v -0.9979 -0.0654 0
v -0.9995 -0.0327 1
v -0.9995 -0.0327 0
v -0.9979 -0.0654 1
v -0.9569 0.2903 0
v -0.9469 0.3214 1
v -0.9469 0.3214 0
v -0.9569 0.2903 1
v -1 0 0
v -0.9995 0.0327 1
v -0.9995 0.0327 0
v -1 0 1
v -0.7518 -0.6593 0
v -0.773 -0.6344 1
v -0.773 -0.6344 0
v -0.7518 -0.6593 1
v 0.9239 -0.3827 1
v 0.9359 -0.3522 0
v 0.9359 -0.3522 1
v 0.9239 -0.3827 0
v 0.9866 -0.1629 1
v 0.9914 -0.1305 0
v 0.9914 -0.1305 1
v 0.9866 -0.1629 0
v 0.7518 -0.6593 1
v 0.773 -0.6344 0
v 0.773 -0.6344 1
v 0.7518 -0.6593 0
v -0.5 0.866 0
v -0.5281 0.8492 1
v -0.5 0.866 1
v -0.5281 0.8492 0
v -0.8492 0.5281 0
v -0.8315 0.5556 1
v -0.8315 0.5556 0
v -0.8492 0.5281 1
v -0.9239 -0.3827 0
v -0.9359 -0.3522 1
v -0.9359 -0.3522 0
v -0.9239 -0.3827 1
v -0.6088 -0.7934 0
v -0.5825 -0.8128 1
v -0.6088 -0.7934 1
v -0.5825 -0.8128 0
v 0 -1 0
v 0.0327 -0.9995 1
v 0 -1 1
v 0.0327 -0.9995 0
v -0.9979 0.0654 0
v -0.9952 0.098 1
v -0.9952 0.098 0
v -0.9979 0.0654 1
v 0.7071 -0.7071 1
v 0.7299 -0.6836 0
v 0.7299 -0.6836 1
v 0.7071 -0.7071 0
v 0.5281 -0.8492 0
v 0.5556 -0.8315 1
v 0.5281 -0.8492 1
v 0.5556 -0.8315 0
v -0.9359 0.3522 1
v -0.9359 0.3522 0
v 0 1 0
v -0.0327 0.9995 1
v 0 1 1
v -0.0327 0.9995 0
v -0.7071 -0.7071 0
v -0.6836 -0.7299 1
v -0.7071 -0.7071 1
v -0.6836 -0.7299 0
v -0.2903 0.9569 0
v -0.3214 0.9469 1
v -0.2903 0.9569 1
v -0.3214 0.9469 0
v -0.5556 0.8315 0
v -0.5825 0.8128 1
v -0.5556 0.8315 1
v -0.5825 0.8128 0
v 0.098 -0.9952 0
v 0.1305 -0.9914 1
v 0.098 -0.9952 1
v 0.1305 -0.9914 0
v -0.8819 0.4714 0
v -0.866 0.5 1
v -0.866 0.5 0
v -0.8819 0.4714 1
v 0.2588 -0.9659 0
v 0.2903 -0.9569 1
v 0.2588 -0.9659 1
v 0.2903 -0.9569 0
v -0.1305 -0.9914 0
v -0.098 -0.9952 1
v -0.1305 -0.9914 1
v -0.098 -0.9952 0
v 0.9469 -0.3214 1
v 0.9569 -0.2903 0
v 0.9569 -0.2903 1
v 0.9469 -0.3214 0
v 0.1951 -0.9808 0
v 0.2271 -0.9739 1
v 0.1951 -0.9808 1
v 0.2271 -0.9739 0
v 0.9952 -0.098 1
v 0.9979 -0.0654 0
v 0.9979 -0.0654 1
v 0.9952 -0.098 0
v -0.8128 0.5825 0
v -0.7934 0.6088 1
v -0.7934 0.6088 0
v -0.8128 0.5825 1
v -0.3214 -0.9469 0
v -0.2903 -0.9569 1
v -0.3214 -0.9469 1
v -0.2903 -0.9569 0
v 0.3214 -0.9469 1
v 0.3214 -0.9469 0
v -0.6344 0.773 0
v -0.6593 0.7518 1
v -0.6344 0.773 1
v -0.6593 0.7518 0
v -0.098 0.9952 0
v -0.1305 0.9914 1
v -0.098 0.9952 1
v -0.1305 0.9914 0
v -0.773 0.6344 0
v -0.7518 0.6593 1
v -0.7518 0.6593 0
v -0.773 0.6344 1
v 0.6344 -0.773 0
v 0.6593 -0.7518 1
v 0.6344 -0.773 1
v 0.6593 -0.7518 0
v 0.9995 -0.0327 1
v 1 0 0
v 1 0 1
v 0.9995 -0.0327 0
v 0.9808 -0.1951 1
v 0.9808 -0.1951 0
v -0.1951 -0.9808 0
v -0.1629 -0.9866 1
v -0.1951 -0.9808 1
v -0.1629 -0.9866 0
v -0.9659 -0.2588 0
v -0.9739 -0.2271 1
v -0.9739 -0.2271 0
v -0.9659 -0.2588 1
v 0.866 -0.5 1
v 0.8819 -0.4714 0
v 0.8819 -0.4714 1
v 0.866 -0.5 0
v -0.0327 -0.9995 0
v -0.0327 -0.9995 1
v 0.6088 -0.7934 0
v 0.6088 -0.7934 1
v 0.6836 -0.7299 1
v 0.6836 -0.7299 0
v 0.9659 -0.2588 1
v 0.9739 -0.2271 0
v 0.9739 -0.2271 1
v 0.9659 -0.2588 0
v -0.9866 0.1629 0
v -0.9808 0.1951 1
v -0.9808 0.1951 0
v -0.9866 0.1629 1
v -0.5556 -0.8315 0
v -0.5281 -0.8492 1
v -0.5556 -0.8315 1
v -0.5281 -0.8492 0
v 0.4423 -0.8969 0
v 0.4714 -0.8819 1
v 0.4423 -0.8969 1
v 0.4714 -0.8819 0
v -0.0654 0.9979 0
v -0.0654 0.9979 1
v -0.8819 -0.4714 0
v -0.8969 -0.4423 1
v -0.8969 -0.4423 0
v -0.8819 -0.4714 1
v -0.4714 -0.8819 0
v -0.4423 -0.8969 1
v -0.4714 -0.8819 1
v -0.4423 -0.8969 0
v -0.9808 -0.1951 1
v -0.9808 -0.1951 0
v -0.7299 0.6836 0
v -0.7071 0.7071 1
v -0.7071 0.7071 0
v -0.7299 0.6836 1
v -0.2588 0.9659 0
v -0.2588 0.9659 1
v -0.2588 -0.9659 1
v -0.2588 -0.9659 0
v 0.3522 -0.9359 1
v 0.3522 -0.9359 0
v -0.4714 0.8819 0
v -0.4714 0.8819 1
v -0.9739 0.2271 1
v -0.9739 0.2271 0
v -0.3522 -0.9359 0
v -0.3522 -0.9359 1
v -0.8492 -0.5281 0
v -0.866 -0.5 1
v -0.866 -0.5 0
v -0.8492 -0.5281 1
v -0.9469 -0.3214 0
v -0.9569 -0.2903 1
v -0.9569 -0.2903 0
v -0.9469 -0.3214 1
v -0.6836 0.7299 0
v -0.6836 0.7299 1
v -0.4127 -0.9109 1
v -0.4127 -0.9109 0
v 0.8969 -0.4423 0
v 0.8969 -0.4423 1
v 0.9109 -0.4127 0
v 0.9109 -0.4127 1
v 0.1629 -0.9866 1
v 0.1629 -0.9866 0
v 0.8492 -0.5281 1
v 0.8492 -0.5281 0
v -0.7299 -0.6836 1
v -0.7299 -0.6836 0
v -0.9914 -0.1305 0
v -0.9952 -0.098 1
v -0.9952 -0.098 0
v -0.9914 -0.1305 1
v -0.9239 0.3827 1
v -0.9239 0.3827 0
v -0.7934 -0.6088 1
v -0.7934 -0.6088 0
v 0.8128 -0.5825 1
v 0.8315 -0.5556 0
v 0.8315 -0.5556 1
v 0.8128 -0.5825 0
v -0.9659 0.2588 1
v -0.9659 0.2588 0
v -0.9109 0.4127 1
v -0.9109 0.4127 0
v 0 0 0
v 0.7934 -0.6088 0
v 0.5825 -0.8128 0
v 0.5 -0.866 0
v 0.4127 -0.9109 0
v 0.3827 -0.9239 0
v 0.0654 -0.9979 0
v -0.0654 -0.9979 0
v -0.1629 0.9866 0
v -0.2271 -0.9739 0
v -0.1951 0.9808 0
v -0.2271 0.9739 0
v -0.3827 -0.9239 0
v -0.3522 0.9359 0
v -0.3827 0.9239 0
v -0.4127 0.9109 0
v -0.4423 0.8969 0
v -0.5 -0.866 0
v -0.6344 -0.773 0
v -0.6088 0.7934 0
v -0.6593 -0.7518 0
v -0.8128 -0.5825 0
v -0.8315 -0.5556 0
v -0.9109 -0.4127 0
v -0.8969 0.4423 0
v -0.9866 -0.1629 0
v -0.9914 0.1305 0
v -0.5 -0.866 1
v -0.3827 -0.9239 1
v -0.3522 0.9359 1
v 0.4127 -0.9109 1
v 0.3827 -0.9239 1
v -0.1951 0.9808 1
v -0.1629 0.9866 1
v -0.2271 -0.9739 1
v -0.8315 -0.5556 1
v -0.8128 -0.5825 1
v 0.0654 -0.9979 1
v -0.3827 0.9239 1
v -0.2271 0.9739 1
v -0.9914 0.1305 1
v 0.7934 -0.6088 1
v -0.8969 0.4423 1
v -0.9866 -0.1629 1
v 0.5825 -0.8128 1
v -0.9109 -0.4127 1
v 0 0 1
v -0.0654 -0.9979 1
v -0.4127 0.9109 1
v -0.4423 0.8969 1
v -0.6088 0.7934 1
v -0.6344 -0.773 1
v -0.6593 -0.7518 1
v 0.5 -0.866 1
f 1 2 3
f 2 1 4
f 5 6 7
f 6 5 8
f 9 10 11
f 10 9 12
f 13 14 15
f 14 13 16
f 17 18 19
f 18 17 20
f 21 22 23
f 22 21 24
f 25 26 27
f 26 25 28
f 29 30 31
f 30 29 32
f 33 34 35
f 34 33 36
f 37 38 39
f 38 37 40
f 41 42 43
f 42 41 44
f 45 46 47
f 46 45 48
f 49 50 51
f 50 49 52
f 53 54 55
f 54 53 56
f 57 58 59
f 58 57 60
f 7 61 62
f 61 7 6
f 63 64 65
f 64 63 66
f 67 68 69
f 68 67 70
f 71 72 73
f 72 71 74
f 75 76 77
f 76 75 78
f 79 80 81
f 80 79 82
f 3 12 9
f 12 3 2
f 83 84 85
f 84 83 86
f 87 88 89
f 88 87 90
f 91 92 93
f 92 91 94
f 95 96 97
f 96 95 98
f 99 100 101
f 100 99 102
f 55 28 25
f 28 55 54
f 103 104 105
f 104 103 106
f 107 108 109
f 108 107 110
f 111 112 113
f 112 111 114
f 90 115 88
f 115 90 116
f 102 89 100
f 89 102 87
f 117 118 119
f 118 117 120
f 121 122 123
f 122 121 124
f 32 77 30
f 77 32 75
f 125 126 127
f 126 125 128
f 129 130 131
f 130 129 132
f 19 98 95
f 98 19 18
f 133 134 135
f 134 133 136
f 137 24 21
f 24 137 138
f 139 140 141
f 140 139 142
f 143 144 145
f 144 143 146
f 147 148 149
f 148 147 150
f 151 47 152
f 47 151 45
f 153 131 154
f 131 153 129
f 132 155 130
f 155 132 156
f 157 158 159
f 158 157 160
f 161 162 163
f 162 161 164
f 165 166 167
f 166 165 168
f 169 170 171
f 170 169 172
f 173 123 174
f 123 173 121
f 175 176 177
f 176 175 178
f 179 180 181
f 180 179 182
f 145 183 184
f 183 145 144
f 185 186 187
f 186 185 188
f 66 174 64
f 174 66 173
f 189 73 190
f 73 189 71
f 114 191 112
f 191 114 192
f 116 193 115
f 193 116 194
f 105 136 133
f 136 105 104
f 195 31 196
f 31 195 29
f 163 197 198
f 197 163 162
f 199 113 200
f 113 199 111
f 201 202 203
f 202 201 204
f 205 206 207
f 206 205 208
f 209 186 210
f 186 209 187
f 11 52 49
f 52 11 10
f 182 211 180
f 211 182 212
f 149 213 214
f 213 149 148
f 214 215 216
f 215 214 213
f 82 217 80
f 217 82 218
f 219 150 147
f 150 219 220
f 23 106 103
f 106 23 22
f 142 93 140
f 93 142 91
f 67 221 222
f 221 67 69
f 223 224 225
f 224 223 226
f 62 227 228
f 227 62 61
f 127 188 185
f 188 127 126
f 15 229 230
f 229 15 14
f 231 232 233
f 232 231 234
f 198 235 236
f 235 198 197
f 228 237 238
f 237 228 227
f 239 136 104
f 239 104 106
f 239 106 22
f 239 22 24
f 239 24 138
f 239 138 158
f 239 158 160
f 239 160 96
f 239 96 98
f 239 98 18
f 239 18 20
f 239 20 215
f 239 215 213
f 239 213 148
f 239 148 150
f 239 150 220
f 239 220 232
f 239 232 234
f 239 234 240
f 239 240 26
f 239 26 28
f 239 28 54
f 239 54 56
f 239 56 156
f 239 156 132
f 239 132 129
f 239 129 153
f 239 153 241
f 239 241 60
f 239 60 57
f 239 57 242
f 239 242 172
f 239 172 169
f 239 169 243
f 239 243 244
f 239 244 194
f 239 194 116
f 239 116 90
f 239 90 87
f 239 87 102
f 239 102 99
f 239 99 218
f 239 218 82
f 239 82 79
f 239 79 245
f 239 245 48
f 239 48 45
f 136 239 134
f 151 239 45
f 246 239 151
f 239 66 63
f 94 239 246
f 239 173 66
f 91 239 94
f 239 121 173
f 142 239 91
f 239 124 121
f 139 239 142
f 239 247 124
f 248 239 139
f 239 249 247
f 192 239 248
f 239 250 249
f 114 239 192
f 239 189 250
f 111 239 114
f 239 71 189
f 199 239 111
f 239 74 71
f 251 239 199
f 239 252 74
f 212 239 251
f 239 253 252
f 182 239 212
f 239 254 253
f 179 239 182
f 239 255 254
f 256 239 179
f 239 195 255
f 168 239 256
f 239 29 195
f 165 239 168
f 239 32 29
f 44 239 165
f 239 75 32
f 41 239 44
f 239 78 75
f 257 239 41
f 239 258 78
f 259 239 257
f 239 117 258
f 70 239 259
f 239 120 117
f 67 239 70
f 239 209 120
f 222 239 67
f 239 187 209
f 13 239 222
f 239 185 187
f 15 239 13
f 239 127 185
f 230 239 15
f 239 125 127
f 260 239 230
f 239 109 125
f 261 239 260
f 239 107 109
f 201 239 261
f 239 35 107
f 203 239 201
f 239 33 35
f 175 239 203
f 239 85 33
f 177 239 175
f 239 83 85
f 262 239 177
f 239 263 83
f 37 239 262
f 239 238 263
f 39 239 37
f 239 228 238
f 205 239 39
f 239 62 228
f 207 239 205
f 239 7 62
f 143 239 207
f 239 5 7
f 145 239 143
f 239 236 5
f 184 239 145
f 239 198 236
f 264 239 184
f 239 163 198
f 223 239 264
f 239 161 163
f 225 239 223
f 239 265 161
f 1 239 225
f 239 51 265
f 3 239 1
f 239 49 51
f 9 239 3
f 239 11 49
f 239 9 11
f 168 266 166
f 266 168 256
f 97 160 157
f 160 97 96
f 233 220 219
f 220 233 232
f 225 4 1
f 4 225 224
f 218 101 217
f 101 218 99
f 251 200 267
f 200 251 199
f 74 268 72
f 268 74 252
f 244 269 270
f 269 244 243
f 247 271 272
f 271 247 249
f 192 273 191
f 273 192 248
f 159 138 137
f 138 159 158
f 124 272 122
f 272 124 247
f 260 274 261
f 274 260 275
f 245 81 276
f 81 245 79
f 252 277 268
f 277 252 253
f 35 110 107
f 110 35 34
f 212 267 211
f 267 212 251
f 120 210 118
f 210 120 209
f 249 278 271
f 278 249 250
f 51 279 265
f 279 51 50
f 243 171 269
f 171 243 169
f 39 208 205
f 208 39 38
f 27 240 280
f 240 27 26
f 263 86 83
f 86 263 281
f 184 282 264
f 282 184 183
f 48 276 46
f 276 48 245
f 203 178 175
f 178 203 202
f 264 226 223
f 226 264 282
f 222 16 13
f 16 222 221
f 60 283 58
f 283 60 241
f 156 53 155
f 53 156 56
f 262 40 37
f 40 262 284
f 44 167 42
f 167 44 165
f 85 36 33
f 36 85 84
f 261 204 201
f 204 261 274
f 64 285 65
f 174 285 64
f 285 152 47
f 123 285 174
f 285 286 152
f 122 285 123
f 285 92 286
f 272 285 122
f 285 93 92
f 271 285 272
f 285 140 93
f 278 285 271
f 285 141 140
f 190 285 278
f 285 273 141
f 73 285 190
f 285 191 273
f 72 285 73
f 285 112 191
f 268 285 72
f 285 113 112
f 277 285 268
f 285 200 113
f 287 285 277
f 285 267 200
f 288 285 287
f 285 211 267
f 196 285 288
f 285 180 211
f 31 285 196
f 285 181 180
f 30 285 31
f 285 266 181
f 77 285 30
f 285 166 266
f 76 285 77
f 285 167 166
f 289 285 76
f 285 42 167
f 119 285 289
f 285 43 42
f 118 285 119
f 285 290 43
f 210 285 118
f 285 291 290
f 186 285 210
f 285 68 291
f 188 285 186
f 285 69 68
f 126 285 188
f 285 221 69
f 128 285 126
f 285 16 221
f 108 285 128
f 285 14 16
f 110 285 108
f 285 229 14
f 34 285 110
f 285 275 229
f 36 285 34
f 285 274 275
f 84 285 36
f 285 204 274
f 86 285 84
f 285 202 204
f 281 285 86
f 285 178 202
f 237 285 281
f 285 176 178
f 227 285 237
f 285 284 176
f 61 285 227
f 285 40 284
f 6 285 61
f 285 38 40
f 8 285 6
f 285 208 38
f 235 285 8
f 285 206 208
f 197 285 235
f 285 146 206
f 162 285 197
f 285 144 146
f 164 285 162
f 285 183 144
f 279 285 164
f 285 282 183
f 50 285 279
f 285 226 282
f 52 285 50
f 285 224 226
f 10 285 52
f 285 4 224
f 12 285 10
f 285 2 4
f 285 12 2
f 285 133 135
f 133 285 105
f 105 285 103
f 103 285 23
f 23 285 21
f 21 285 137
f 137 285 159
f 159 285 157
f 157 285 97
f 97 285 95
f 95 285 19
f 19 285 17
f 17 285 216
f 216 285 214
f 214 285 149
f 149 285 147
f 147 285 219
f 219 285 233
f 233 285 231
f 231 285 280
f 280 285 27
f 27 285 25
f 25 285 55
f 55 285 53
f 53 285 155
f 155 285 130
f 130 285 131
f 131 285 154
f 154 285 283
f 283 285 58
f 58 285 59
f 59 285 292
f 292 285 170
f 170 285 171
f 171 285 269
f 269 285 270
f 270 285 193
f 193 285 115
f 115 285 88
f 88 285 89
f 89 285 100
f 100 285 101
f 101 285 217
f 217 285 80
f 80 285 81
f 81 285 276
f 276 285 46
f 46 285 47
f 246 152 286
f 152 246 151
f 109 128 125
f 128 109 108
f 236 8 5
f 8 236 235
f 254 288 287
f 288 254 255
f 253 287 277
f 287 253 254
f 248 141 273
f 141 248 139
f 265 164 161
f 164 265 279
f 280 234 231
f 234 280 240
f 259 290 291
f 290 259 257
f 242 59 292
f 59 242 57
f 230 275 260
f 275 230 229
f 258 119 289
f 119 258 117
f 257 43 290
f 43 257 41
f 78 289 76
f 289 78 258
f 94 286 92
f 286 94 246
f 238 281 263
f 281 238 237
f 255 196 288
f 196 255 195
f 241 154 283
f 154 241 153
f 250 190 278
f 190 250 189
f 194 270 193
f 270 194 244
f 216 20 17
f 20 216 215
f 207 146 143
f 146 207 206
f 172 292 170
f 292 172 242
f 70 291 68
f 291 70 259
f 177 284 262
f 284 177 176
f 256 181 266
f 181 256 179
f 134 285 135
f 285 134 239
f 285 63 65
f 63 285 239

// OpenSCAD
// PET-bottle treat dispenser: an inclined disc with four rim notches lifts one treat at a time out of the pile and drops it through
// the back plate into the chute; a 28BYJ-48 turns it through a 15:30 spur pair. Original CanFactory design, CC BY 4.0.
//
// Every dimension comes from LAYOUT, a list of [name, value] pairs written by packages/contracts/src/treatDispenser.ts
// (treatScadValues): the same numbers the physics' collision pieces and the assembly poses are made from. Parts drawn in the disc
// frame D (origin on the disc's axis in the plane of its face, +Z out of the face, +Y up the incline) are moved into their print frame
// by their F_* entry: [flip (180° about X), dx, dy, dz]. Parts that stand upright in the world (adapter, coupon, bracket) are drawn in
// the assembled frame W and laid on the bed. Millimetres.

PART = "disc";
LAYOUT = [];

function L(name) = let(i = search([name], LAYOUT, 1, 0)[0]) i == undef ? undef : LAYOUT[i][1];

$fn = 64;
TD = L("TD"); DISC_R = L("DISC_R"); NOTCH = L("NOTCH"); NOTCH_ANGLES = L("NOTCH_ANGLES"); OUTLET = L("OUTLET");
PLATE_TOP = L("PLATE_TOP"); PLATE_BOTTOM = L("PLATE_BOTTOM"); PLATE_R = L("PLATE_R");
SPINDLE = L("SPINDLE"); SPINDLE_FLAT = L("SPINDLE_FLAT"); FIT = L("FIT");
GEAR = L("GEAR"); GEAR_TIP = L("GEAR_TIP"); PINION = L("PINION"); PINION_TIP = L("PINION_TIP");
GEAR_TOP = L("GEAR_TOP"); GEAR_BOTTOM = L("GEAR_BOTTOM"); PINION_AT = L("PINION_AT"); CAN_AT = L("CAN_AT");
COVER_FRONT = L("COVER_FRONT"); COVER_BACK = L("COVER_BACK"); EAR_SPAN = L("EAR_SPAN");
BOSS_D = L("BOSS_D"); SHAFT_D = L("SHAFT_D"); SHAFT_FLATS = L("SHAFT_FLATS");
CHUTE_FLOOR = L("CHUTE_FLOOR"); CHUTE_DEPTH = L("CHUTE_DEPTH"); CHUTE_WALL = L("CHUTE_WALL"); WALL = L("WALL");
RIM_IN = L("RIM_IN"); RIM_OUT = L("RIM_OUT"); LID = L("LID"); LID_TOP = L("LID_TOP");
BETA = L("BETA"); MOUTH = L("MOUTH"); TUBE_BORE = L("TUBE_BORE"); TUBE_WALL = L("TUBE_WALL"); TUBE_LENGTH = L("TUBE_LENGTH");
NECK_T = L("NECK_T"); NECK_E = L("NECK_E"); NECK_PITCH = L("NECK_PITCH"); NECK_TURNS = L("NECK_TURNS");
THREAD_CLEARANCE = L("THREAD_CLEARANCE"); ADAPTER_H = L("ADAPTER_H");
M3_HOLE = L("M3_HOLE"); M3_NUT_S = L("M3_NUT_S"); M3_NUT_M = L("M3_NUT_M"); M25_PILOT = L("M25_PILOT");
INSERT_HOLE = L("INSERT_HOLE"); INSERT_DEPTH = L("INSERT_DEPTH");
WALL_Y = L("WALL_Y"); LUGS = L("LUGS"); SEAT_W = L("SEAT_W"); BOTTLE_D = L("BOTTLE_D"); BAY = L("BAY");
DRIVER_POS = L("DRIVER_POS"); DRIVER_HOLES = L("DRIVER_HOLES"); CASE_POS = L("CASE_POS"); CASE_ROT = L("CASE_ROT"); CASE_BASE = L("CASE_BASE");

// the spindle: a round collar through the plate's bushing (the disc sits on its shoulder), then a D into the disc
COLLAR = SPINDLE + 2;
// the gear rests on a thrust boss on the cover around its pin
PIN_D = 4; THRUST = GEAR_BOTTOM - COVER_FRONT - 0.2;
// lugs on the plate's rim: three for the chamber, two (±X) for the bracket's arms
HOPPER_LUGS = [90, 210, 330]; LUG_R = PLATE_R + 6; LUG_PAD = 11;
FLANGE_D = 50; FLANGE_T = 4; FLANGE_HOLE = 18;

module print_frame(f) {
  translate([f[1], f[2], f[3]]) if (f[0] == 1) rotate([180, 0, 0]) children(); else children();
}
module d_shape(r, flat) { intersection() { circle(r = r, $fn = 64); translate([-r, -r]) square([r + flat, 2 * r]); } }
module pad(r) { circle(r = r, $fn = 48); }

// ------------------------------------------------------------------------------------------------------------------- the disc
module disc() {
  difference() {
    translate([0, 0, -TD]) cylinder(r = DISC_R, h = TD, $fn = 192);
    for (a = NOTCH_ANGLES) rotate([0, 0, a]) translate([0, 0, -TD - 1]) linear_extrude(TD + 2) polygon(NOTCH);
    translate([0, 0, -TD - 1]) linear_extrude(TD + 2) d_shape(SPINDLE / 2 + FIT, SPINDLE_FLAT + FIT);
    // index mark: a 1 mm groove on the face, half way between notch 1 and notch 4, to line up with the chamber's mark
    rotate([0, 0, NOTCH_ANGLES[0] - 45]) translate([DISC_R - 7, -0.5, -0.8]) cube([8, 1, 1]);
  }
}

// --------------------------------------------------------------------------------------------- the gear and its spindle, one part
module gear() {
  difference() {
    union() {
      translate([0, 0, GEAR_BOTTOM]) linear_extrude(GEAR_TOP - GEAR_BOTTOM) polygon(GEAR);
      // collar from the gear up through the bushing to the disc's underside, then the D into the disc (0.5 below its face)
      translate([0, 0, GEAR_TOP - 0.01]) cylinder(d = COLLAR, h = -TD - GEAR_TOP + 0.01, $fn = 64);
      translate([0, 0, -TD - 0.01]) linear_extrude(TD - 0.5 + 0.01) d_shape(SPINDLE / 2, SPINDLE_FLAT);
    }
    translate([0, 0, GEAR_BOTTOM - 0.01]) cylinder(d = PIN_D + 2 * FIT, h = 3, $fn = 32);
  }
}

// ---------------------------------------------------------------------------------------- the pinion, on the motor's flatted shaft
module pinion() {
  translate([PINION_AT[0], PINION_AT[1], GEAR_BOTTOM]) difference() {
    linear_extrude(GEAR_TOP - GEAR_BOTTOM) polygon(PINION);
    translate([0, 0, -1]) linear_extrude(GEAR_TOP - GEAR_BOTTOM + 2) intersection() {
      circle(d = SHAFT_D + 0.15, $fn = 48);
      square([SHAFT_D + 1, SHAFT_FLATS + 0.15], center = true);
    }
    // the shaft is round, not flatted, for up to 0.7 mm below its flats' longest start: a counterbore
    translate([0, 0, -0.01]) cylinder(d = SHAFT_D + 0.3, h = 0.8, $fn = 48);
  }
}

// ------------------------------------------------------------------------------------------- the body: plate, gearbox and chute
// 0.05 mm past the gear's clearance, so its wall overlaps the chute's rather than sharing a face with it
module gearbox_inner() { hull() { pad(GEAR_TIP + 1.05); translate(PINION_AT) pad(PINION_TIP + 1); } }
module gearbox_outer() { offset(r = WALL) gearbox_inner(); }
// the chute is the outlet's own outline carried straight back, its walls round it: one cut through the plate and the chute
module chute_walls() { difference() { offset(delta = CHUTE_WALL) polygon(OUTLET); polygon(OUTLET); } }
// cover screws: outside the gearbox wall, either side of the gear and below the pinion
COVER_SCREWS = [[GEAR_TIP + 1 + WALL + 3.5, 0], [-(GEAR_TIP + 1 + WALL + 3.5), 0], [0, PINION_AT[1] - PINION_TIP - 1 - WALL - 3.5]];
module body() {
  difference() {
    union() {
      translate([0, 0, PLATE_BOTTOM]) cylinder(r = PLATE_R, h = PLATE_TOP - PLATE_BOTTOM, $fn = 144);
      for (a = concat(HOPPER_LUGS, [0, 180])) rotate([0, 0, a]) hull() {
        translate([PLATE_R - 4, 0, PLATE_BOTTOM]) cylinder(r = LUG_PAD / 2, h = PLATE_TOP - PLATE_BOTTOM);
        translate([LUG_R, 0, PLATE_BOTTOM]) cylinder(r = LUG_PAD / 2, h = PLATE_TOP - PLATE_BOTTOM);
      }
      translate([0, 0, PLATE_BOTTOM - 0.6]) cylinder(r = COLLAR / 2 + FIT + 2, h = 0.61);
      translate([0, 0, COVER_FRONT]) linear_extrude(PLATE_BOTTOM - COVER_FRONT + 0.01) difference() { gearbox_outer(); gearbox_inner(); }
      translate([0, 0, PLATE_BOTTOM - CHUTE_DEPTH]) linear_extrude(CHUTE_DEPTH + 0.01) chute_walls();
      for (q = COVER_SCREWS) translate([q[0], q[1], COVER_FRONT]) cylinder(d = INSERT_HOLE + 2 * 1.8, h = PLATE_BOTTOM - COVER_FRONT + 0.01);
    }
    translate([0, 0, PLATE_BOTTOM - CHUTE_DEPTH - 1]) linear_extrude(CHUTE_DEPTH + PLATE_TOP - PLATE_BOTTOM + 2) polygon(OUTLET);
    translate([0, 0, PLATE_BOTTOM - 2]) cylinder(d = COLLAR + 2 * FIT, h = PLATE_TOP - PLATE_BOTTOM + 3, $fn = 64);
    for (a = concat(HOPPER_LUGS, [0, 180])) rotate([0, 0, a]) translate([LUG_R, 0, PLATE_BOTTOM - 1]) cylinder(d = M3_HOLE, h = 10, $fn = 24);
    for (q = COVER_SCREWS) translate([q[0], q[1], COVER_FRONT - 0.01]) cylinder(d = INSERT_HOLE, h = INSERT_DEPTH, $fn = 24);
  }
}

// ------------------------------------------------------------------------------- the cover: closes the gearbox, carries the motor
module cover_outline() {
  // cut short of the chute's floor, which closes the gearbox on that side
  intersection() {
    hull() { gearbox_outer(); for (q = COVER_SCREWS) translate(q) pad(4.5); for (s = [-1, 1]) translate([CAN_AT[0] + s * EAR_SPAN / 2, CAN_AT[1]]) pad(4.5); }
    translate([-100, -200]) square([200, 200 + CHUTE_FLOOR - CHUTE_WALL - 0.2]);
  }
}
module cover() {
  difference() {
    union() {
      translate([0, 0, COVER_BACK]) linear_extrude(COVER_FRONT - COVER_BACK) cover_outline();
      translate([0, 0, COVER_FRONT - 0.01]) cylinder(d = PIN_D + 4, h = THRUST + 0.01, $fn = 32);
      translate([0, 0, COVER_FRONT - 0.01]) cylinder(d = PIN_D, h = THRUST + 2.2, $fn = 32);
    }
    // the motor's boss and shaft, its two ears
    translate([PINION_AT[0], PINION_AT[1], COVER_BACK - 1]) cylinder(d = BOSS_D + 1, h = COVER_FRONT - COVER_BACK + 2, $fn = 48);
    for (s = [-1, 1]) translate([CAN_AT[0] + s * EAR_SPAN / 2, CAN_AT[1], COVER_BACK - 1]) {
      cylinder(d = M3_HOLE, h = 10, $fn = 24);
      // the nut on the gearbox side, outside the wall
      translate([0, 0, COVER_FRONT - COVER_BACK + 1 - M3_NUT_M]) cylinder(d = M3_NUT_S / cos(30) + 0.3, h = M3_NUT_M + 1, $fn = 6);
    }
    for (q = COVER_SCREWS) translate([q[0], q[1], COVER_BACK - 1]) cylinder(d = M3_HOLE, h = 10, $fn = 24);
  }
}

// ------------------------------------------------------------------------- the chamber: rim wall, lid and the bottle's feed tube
module tube_frame() { translate(MOUTH) rotate([-BETA, 0, 0]) children(); }
module hopper() {
  difference() {
    union() {
      translate([0, 0, PLATE_TOP]) cylinder(r = RIM_OUT, h = LID_TOP - PLATE_TOP, $fn = 144);
      for (a = HOPPER_LUGS) rotate([0, 0, a]) hull() {
        translate([RIM_OUT - 3, 0, PLATE_TOP]) cylinder(r = LUG_PAD / 2, h = 4);
        translate([LUG_R, 0, PLATE_TOP]) cylinder(r = LUG_PAD / 2, h = 4);
      }
      tube_frame() {
        cylinder(r = TUBE_BORE / 2 + TUBE_WALL, h = TUBE_LENGTH, $fn = 72);
        translate([0, 0, TUBE_LENGTH - FLANGE_T]) cylinder(d = FLANGE_D, h = FLANGE_T, $fn = 72);
      }
    }
    translate([0, 0, PLATE_TOP - 1]) cylinder(r = RIM_IN, h = LID - PLATE_TOP + 1, $fn = 144);
    tube_frame() {
      translate([0, 0, -1]) cylinder(r = TUBE_BORE / 2, h = TUBE_LENGTH + 2, $fn = 72);
      for (s = [-1, 1]) translate([s * FLANGE_HOLE, 0, TUBE_LENGTH - FLANGE_T - 8]) {
        cylinder(d = M3_HOLE, h = 20, $fn = 24);
        cylinder(d = M3_NUT_S / cos(30) + 0.3, h = 8 + FLANGE_T - 1.6, $fn = 6);
      }
    }
    for (a = HOPPER_LUGS) rotate([0, 0, a]) translate([LUG_R, 0, PLATE_TOP - 1]) cylinder(d = M3_HOLE, h = 10, $fn = 24);
    // index mark on the rim, in line with the disc's mark when a notch rests either side of the outlet
    rotate([0, 0, NOTCH_ANGLES[0] - 45]) translate([RIM_IN - 0.5, -0.5, PLATE_TOP + 2]) cube([1.2, 1, 6]);
    // nothing may reach below the plate's top
    translate([0, 0, PLATE_TOP - 50]) cylinder(r = 200, h = 50);
  }
}

// -------------------------------------------------------------------------------------------------- bottle thread: adapter, coupon
// The bottle's thread ridge grown by the clearance, swept along its helix: cut from a bore just over the bottle's root diameter.
module thread_cutter(turns) {
  fn = 72; steps = ceil(turns * fn);
  r0 = NECK_E / 2 - 0.3; r1 = NECK_T / 2 + THREAD_CLEARANCE;
  base = NECK_PITCH * 0.6 + 2 * THREAD_CLEARANCE; crest = NECK_PITCH * 0.3 + 2 * THREAD_CLEARANCE;
  profile = [[r0, -base / 2], [r0, base / 2], [r1, crest / 2], [r1, -crest / 2]];
  n = len(profile);
  points = [for (i = [0:steps]) let(a = i * 360 / fn, z = i * NECK_PITCH / fn) for (q = profile) [q[0] * cos(a), q[0] * sin(a), z + q[1]]];
  faces = concat(
    [[for (k = [0:n - 1]) k]],
    [[for (k = [n - 1:-1:0]) steps * n + k]],
    [for (i = [0:steps - 1]) for (k = [0:n - 1]) [i * n + k, (i + 1) * n + k, (i + 1) * n + (k + 1) % n, i * n + (k + 1) % n]]
  );
  polyhedron(points, faces, convexity = 6);
}
module bottle_bore(h, turns, top) {
  translate([0, 0, -0.01]) cylinder(d = NECK_E + 2 * THREAD_CLEARANCE, h = h + 0.02, $fn = 96);
  translate([0, 0, top - turns * NECK_PITCH - NECK_PITCH]) thread_cutter(turns);
}
module adapter() {
  difference() {
    union() {
      cylinder(d = FLANGE_D, h = FLANGE_T, $fn = 96);
      cylinder(d = NECK_T + 2 * THREAD_CLEARANCE + 6, h = ADAPTER_H, $fn = 96);
    }
    translate([0, 0, -1]) cylinder(d = TUBE_BORE, h = FLANGE_T + 1, $fn = 96);
    translate([0, 0, FLANGE_T]) bottle_bore(ADAPTER_H - FLANGE_T, NECK_TURNS, ADAPTER_H - FLANGE_T - 1);
    for (s = [-1, 1]) translate([s * FLANGE_HOLE, 0, -1]) cylinder(d = M3_HOLE, h = FLANGE_T + 2, $fn = 24);
  }
}
module coupon() {
  h = 10;
  difference() {
    cylinder(d = NECK_T + 2 * THREAD_CLEARANCE + 6, h = h, $fn = 96);
    bottle_bore(h, min(NECK_TURNS, (h - 2) / NECK_PITCH - 1), h - 1);
  }
}

// ----------------------------------------------------------------------- the wall bracket: arms to the body, strap, electronics bay
module bracket_w() {
  y0 = WALL_Y; t = 3;
  z0 = 2; z1 = SEAT_W[2] + 70;
  x0 = -50; x1 = BAY[1] + 3;
  plate_n = [0, sin(BETA), cos(BETA)];
  difference() {
    union() {
      translate([x0, y0, z0]) cube([x1 - x0, t, z1 - z0]);
      // arms: from a pad on each lug on the plate's rim (on its chamber side, so the arm rises away from the plate) back to the wall
      for (q = LUGS) hull() {
        translate(q) rotate([-BETA, 0, 0]) translate([0, 0, PLATE_TOP - PLATE_BOTTOM]) cylinder(d = LUG_PAD, h = 3, $fn = 32);
        translate([q[0] - LUG_PAD / 2, y0, q[2] - LUG_PAD / 2]) cube([LUG_PAD, 0.01, LUG_PAD]);
      }
      // the bay's walls
      translate([BAY[0], y0 - 22, BAY[2]]) difference() {
        cube([BAY[1] - BAY[0], 22.01, BAY[3] - BAY[2]]);
        translate([2, -1, 2]) cube([BAY[1] - BAY[0] - 4, 22, BAY[3] - BAY[2] - 4]);
      }
      // ULN2003 standoffs
      for (h = DRIVER_HOLES) translate([DRIVER_POS[0] + h[0], y0 + 0.01, DRIVER_POS[2] + h[1]]) rotate([90, 0, 0]) cylinder(d = 6, h = y0 - DRIVER_POS[1] + 0.01, $fn = 24);
      // the case's cradle, built in the case's own frame
      translate(CASE_POS) rotate(CASE_ROT) cradle();
    }
    for (q = LUGS) translate(q) rotate([-BETA, 0, 0]) translate([0, 0, -20]) cylinder(d = M3_HOLE, h = 40, $fn = 24);
    for (h = DRIVER_HOLES) translate([DRIVER_POS[0] + h[0], y0 + 1, DRIVER_POS[2] + h[1]]) rotate([90, 0, 0]) cylinder(d = M25_PILOT, h = 20, $fn = 16);
    // keyholes, and slots for a strap round the bottle
    for (x = [x0 + 15, x1 - 15]) translate([x, y0 - 1, z1 - 15]) rotate([-90, 0, 0]) { cylinder(d = 8, h = t + 2); translate([-2, -10, 0]) cube([4, 10, t + 2]); }
    for (s = [-1, 1]) translate([s * (BOTTLE_D / 2 + 6) - 2.5, y0 - 1, SEAT_W[2] + 35]) cube([5, t + 2, 25]);
    // the USB cable leaves the bay downwards, under the case
    translate([CASE_POS[0] - 7, y0 - 23, BAY[2] - 1]) cube([14, 22, 4]);
  }
}
module cradle() {
  l = CASE_BASE[0]; w = CASE_BASE[1]; zb = CASE_BASE[2];
  back = -(WALL_Y - CASE_POS[1]);
  difference() {
    // from the wall (at case z = back) up to 4 mm over the case's floor
    translate([-l / 2 - 2.5, -w / 2 - 2.5, back]) cube([l + 5, w + 5, zb + 4 - back]);
    // the case base, a sliding fit
    translate([-l / 2 - 0.3, -w / 2 - 0.3, zb]) cube([l + 0.6, w + 0.6, 10]);
    // room behind it for the pins and the jumper wires' plugs, open at the sides
    translate([-l / 2 + 1.5, -w / 2 - 5, back + 3]) cube([l - 3, w + 10, zb - back - 3 + 0.01]);
    // USB-C end open but for a lip, so the case cannot fall out; the plug passes through it
    translate([-l / 2 - 5, -6, zb - 0.01]) cube([5, 12, 8]);
  }
}
module bracket() { translate([0, 0, WALL_Y + 3]) rotate([-90, 0, 0]) bracket_w(); }

if (PART == "disc") print_frame(L("F_DISC")) disc();
else if (PART == "gear") print_frame(L("F_GEAR")) gear();
else if (PART == "pinion") print_frame(L("F_PINION")) pinion();
else if (PART == "body") print_frame(L("F_BODY")) body();
else if (PART == "cover") print_frame(L("F_COVER")) cover();
else if (PART == "hopper") print_frame(L("F_HOPPER")) hopper();
else if (PART == "adapter") adapter();
else if (PART == "coupon") coupon();
else if (PART == "bracket") bracket();
